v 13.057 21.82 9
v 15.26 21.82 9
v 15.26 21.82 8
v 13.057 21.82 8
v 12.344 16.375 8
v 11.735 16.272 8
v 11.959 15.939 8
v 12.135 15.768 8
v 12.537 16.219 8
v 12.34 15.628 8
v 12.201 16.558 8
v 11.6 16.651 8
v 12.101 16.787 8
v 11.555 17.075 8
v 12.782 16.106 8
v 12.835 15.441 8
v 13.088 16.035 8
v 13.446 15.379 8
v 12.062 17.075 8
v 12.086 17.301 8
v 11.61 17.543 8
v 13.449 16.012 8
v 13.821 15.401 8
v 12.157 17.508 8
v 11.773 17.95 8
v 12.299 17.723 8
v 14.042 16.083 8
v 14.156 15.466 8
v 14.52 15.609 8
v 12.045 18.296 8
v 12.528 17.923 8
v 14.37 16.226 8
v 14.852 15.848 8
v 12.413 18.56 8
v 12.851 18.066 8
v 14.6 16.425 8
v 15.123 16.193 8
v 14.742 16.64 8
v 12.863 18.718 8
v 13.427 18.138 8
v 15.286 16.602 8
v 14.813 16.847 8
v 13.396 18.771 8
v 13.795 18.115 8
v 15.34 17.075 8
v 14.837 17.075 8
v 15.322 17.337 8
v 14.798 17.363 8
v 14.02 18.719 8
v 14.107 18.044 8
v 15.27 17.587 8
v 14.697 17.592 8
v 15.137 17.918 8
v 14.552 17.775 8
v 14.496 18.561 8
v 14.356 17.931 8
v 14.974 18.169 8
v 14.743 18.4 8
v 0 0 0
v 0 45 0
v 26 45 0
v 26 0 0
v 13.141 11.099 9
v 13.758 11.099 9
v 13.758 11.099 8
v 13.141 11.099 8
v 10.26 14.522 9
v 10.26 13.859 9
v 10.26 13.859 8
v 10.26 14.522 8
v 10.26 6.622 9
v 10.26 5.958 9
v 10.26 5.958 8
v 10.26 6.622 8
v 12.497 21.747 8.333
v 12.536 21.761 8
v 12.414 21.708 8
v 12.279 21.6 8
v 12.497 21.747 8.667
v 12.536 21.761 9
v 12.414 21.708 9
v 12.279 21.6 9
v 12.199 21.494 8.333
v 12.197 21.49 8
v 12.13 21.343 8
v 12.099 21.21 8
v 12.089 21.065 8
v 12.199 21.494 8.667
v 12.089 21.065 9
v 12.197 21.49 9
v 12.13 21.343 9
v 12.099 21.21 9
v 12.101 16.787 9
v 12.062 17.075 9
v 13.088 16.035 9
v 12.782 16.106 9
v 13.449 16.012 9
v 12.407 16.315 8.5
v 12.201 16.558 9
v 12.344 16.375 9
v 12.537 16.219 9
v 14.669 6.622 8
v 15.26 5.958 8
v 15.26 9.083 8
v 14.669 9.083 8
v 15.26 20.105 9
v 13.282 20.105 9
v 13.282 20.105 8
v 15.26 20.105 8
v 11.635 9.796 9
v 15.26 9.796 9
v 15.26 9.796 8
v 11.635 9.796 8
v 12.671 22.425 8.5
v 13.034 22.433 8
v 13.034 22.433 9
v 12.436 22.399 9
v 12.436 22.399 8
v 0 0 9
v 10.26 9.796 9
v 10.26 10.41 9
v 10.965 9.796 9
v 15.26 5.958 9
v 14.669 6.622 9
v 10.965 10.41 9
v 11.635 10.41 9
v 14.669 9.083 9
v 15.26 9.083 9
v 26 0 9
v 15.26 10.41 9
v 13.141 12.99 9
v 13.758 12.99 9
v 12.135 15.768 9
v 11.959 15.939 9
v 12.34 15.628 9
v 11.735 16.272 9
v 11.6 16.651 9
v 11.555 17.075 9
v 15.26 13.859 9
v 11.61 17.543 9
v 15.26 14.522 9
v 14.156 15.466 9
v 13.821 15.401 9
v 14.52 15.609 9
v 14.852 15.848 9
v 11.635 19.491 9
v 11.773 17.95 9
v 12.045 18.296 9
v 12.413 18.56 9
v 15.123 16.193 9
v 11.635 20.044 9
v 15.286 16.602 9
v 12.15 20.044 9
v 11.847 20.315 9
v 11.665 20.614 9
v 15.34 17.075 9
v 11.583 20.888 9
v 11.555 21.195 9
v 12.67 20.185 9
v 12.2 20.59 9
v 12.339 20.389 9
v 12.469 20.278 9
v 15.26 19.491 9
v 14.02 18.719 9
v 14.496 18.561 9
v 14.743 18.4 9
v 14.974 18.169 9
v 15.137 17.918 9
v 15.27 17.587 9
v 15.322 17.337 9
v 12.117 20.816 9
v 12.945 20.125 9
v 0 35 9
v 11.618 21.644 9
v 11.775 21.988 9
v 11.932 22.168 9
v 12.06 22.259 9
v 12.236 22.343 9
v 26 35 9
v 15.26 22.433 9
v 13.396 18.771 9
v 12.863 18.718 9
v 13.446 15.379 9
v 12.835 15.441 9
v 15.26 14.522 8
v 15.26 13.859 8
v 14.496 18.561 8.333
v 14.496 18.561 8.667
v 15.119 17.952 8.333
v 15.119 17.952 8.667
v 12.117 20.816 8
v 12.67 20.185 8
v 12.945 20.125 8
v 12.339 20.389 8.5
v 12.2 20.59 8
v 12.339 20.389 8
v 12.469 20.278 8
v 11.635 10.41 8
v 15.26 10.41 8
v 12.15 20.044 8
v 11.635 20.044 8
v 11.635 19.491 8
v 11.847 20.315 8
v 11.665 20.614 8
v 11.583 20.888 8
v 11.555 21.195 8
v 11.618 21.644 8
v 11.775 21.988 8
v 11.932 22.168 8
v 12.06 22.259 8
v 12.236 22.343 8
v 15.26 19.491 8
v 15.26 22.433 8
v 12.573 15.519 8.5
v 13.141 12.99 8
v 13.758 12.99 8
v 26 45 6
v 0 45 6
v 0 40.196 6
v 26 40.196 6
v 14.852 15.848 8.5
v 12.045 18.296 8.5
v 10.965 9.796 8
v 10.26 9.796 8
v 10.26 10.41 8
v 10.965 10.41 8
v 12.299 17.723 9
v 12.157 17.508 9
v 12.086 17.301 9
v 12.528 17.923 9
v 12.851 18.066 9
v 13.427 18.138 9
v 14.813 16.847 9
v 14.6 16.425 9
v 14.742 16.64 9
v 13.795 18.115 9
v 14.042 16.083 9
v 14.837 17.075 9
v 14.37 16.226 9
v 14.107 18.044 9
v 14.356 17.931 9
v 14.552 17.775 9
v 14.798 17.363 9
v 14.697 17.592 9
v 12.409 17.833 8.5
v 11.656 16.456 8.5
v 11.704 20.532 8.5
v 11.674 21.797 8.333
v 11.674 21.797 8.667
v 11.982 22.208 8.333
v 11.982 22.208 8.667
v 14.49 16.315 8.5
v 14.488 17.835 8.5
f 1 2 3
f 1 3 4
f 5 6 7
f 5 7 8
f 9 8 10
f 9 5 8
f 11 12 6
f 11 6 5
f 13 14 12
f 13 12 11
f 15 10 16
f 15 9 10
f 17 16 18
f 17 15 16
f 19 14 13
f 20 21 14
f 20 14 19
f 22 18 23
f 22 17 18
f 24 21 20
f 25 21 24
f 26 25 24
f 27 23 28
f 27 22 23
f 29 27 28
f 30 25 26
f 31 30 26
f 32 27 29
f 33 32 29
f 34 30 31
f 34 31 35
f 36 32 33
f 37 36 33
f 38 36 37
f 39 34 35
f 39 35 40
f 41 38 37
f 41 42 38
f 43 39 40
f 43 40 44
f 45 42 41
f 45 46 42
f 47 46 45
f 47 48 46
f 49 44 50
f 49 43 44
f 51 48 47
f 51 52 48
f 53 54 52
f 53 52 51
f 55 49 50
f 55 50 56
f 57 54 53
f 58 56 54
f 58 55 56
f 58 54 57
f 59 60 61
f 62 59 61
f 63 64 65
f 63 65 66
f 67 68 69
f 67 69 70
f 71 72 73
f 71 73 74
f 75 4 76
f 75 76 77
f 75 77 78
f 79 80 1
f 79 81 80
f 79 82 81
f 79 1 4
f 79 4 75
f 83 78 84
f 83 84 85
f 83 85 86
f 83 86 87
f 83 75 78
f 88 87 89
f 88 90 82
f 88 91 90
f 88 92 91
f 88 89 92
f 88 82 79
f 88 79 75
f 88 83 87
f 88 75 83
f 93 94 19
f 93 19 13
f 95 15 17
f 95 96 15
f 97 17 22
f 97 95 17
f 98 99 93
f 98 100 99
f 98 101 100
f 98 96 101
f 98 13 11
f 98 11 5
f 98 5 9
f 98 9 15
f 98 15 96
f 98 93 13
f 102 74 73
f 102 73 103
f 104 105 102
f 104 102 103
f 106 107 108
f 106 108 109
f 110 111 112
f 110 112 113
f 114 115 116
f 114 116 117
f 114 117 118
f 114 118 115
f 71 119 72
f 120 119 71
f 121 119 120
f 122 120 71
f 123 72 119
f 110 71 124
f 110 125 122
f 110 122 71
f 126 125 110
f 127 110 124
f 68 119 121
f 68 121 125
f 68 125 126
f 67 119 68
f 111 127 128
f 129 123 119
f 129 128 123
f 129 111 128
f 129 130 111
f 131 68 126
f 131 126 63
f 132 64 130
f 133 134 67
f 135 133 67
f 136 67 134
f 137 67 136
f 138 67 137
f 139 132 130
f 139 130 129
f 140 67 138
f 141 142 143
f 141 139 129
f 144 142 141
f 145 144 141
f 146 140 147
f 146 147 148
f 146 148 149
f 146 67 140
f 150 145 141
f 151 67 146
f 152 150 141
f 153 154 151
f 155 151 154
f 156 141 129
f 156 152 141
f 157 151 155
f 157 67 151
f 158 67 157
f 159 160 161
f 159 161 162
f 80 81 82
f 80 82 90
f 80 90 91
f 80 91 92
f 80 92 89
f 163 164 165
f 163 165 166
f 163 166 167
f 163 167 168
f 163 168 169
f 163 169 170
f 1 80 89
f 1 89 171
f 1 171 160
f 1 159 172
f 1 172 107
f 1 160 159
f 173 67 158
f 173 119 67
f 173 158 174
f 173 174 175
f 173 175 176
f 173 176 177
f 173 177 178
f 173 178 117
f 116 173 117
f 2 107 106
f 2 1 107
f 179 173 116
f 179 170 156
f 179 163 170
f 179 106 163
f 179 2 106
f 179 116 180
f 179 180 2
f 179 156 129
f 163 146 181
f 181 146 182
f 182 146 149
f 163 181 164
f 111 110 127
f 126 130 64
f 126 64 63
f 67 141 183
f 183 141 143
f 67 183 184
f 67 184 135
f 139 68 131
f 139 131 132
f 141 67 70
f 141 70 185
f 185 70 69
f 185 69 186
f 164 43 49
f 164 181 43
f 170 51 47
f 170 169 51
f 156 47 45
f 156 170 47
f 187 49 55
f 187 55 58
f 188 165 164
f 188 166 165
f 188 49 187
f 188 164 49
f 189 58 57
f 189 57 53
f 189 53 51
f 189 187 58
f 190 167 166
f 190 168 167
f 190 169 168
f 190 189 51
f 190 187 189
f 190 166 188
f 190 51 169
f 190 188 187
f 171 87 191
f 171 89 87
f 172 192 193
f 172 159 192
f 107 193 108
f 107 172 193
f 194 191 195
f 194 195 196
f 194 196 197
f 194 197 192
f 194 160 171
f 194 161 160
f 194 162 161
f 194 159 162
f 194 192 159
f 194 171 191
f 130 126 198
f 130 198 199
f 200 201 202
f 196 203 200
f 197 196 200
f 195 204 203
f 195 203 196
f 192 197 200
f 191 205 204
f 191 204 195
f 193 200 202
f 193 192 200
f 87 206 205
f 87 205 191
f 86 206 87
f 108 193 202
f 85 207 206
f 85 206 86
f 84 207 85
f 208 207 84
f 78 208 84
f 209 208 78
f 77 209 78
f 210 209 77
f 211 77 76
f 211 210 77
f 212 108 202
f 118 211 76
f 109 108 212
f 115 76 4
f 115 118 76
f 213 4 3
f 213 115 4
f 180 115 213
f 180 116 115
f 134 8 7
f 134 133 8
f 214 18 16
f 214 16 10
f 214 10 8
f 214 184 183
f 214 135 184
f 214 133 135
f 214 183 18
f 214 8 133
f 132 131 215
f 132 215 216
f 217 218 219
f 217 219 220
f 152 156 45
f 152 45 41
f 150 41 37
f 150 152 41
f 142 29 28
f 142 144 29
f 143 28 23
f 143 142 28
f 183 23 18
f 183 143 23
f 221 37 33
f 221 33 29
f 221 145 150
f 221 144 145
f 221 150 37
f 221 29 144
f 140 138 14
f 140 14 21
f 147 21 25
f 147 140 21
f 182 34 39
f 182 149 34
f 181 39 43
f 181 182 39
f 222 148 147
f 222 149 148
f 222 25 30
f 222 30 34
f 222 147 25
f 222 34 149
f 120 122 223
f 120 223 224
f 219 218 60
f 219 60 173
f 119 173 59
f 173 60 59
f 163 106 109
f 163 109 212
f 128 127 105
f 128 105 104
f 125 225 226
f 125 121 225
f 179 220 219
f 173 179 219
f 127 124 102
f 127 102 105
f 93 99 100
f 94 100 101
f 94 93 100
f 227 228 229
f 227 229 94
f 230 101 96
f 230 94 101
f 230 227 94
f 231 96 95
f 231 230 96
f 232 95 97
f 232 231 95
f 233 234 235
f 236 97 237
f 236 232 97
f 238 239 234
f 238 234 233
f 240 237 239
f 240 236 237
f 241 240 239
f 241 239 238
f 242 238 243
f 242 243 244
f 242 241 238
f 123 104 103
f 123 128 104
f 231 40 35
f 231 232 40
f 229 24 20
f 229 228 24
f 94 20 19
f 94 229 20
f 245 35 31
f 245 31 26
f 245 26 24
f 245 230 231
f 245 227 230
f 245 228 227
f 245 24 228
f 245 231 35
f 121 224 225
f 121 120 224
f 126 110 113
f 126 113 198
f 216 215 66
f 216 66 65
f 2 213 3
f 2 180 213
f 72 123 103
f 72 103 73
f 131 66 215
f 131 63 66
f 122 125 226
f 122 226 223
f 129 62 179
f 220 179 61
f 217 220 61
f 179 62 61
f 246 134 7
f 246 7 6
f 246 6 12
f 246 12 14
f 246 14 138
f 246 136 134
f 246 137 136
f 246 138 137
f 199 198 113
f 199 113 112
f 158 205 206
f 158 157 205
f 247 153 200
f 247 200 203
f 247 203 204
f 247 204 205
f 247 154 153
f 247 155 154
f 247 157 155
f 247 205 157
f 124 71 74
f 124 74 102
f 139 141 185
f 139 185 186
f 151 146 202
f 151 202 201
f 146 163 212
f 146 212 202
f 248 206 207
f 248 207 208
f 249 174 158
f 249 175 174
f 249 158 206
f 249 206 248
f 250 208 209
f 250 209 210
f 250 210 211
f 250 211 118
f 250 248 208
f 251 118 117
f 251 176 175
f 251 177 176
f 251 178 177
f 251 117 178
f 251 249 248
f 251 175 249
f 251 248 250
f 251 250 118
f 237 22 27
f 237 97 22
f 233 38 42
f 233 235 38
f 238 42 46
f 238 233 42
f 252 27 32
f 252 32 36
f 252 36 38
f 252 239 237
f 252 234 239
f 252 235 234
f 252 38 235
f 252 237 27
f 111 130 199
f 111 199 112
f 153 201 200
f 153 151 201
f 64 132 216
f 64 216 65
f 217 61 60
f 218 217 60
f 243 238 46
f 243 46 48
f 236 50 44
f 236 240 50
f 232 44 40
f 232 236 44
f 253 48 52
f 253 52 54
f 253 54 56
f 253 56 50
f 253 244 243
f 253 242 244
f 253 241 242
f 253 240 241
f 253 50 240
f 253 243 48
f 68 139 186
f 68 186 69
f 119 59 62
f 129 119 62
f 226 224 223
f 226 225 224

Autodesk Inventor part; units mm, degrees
ref_plane "YZ Plane" through (0, 0, 0) normal (1, 0, 0) x (0, 1, 0)
ref_plane "XZ Plane" through (0, 0, 0) normal (0, 1, 0) x (-1, 0, 0)
ref_plane "XY Plane" through (0, 0, 0) normal (0, 0, 1) x (1, 0, 0)
sketch "Sketch1" plane through (0, 0, 0) normal (0, 0, 1) x (1, 0, 0)
  line L0 (0, 0) -> (26, 0)
  line L1 (26, 0) -> (26, 45)
  line L2 (26, 45) -> (0, 45)
  line L3 (0, 45) -> (0, 0)
  dimension "d0" = 26
  dimension "d1" = 45
extrude "Extrusion1" add sketch "Sketch1" along normal blind 6
sketch "Sketch2" plane through (0, 0, 6) normal (0, 0, 1) x (1, 0, 0)
  line L0 (26, 0) -> (26, 45) projected
  line L1 (0, 0) -> (26, 0)
  line L2 (26, 0) -> (26, 35)
  line L3 (26, 35) -> (0, 35)
  line L4 (0, 35) -> (0, 0)
  dimension "d4" = 35
extrude "Extrusion2" add sketch "Sketch2" along normal blind 3
draft "FaceDraft1" angle 60 pull direction (0, 0, 1) faces at (17.3333, 35, 7) fixed edges at (13, 35, 9)
sketch "Sketch3" plane through (0, 0, 9) normal (0, 0, 1) x (1, 0, 0)
  line L0 (10.2597, 5.4477) -> (10.2597, 19.6754) construction
  line L1 (10.2597, 19.6754) -> (17.2769, 19.6754) construction
  line L2 (17.2769, 19.6754) -> (17.2769, 5.4477) construction
  line L3 (17.2769, 5.4477) -> (10.2597, 5.4477) construction
  line L4 (0, 0) -> (26, 0) projected
  line L5 (13, 0) -> (13, 5.1104)
  line L6 (15.2597, 5.9584) -> (10.2597, 5.9584)
  line L7 (10.2597, 5.9584) -> (10.2597, 6.6215)
  line L8 (10.2597, 6.6215) -> (14.669, 6.6215)
  line L9 (14.669, 6.6215) -> (14.669, 9.0834)
  line L10 (14.669, 9.0834) -> (15.2597, 9.0834)
  line L11 (15.2597, 9.0834) -> (15.2597, 5.9584)
  line L12 (15.2597, 9.7961) -> (11.6354, 9.7961)
  line L13 (11.6354, 9.7961) -> (11.6354, 10.4096)
  line L14 (11.6354, 10.4096) -> (15.2597, 10.4096)
  line L15 (15.2597, 10.4096) -> (15.2597, 9.7961)
  line L16 (10.9647, 9.7961) -> (10.2597, 9.7961)
  line L17 (10.2597, 9.7961) -> (10.2597, 10.4096)
  line L18 (10.2597, 10.4096) -> (10.9647, 10.4096)
  line L19 (10.9647, 10.4096) -> (10.9647, 9.7961)
  line L20 (13.7581, 11.0994) -> (13.1408, 11.0994)
  line L21 (13.1408, 11.0994) -> (13.1408, 12.9897)
  line L22 (13.1408, 12.9897) -> (13.7581, 12.9897)
  line L23 (13.7581, 12.9897) -> (13.7581, 11.0994)
  line L24 (15.2597, 13.8586) -> (10.2597, 13.8586)
  line L25 (10.2597, 13.8586) -> (10.2597, 14.5217)
  line L26 (10.2597, 14.5217) -> (15.2597, 14.5217)
  line L27 (15.2597, 14.5217) -> (15.2597, 13.8586)
  spline S0 degree 2 poles (13.4456, 15.3791) (12.4433, 15.3791) (11.9593, 15.9394) knots 0 0 0 1 1 1
  spline S1 degree 2 poles (11.9593, 15.9394) (11.5554, 16.4043) (11.5554, 17.075) knots 0 0 0 1 1 1
  spline S2 degree 2 poles (11.5554, 17.075) (11.5554, 17.822) (12.5348, 18.7709) (13.3961, 18.7709) knots 0 0 0 1 2 2 2
  spline S3 degree 2 poles (13.3961, 18.7709) (14.0935, 18.7709) (14.8976, 18.3517) (15.3397, 17.5514) (15.3397, 17.075) knots 0 0 0 1 2 3 3 3
  spline S4 degree 2 poles (15.3397, 17.075) (15.3397, 16.3166) (14.3641, 15.3791) (13.4456, 15.3791) knots 0 0 0 1 2 2 2
  spline S5 degree 2 poles (13.4494, 16.0118) (14.143, 16.0118) (14.8366, 16.6177) (14.8366, 17.075) knots 0 0 0 1 2 2 2
  spline S6 degree 2 poles (14.8366, 17.075) (14.8366, 17.5323) (14.1392, 18.1383) (13.4266, 18.1383) knots 0 0 0 1 2 2 2
  spline S7 degree 2 poles (13.4266, 18.1383) (12.7558, 18.1383) (12.0622, 17.5285) (12.0622, 17.075) knots 0 0 0 1 2 2 2
  spline S8 degree 2 poles (12.0622, 17.075) (12.0622, 16.6177) (12.752, 16.0118) (13.4494, 16.0118) knots 0 0 0 1 2 2 2
  line L28 (15.2597, 19.4912) -> (11.6354, 19.4912)
  line L29 (11.6354, 19.4912) -> (11.6354, 20.0438)
  line L30 (11.6354, 20.0438) -> (12.1499, 20.0438)
  spline S9 degree 2 poles (12.1499, 20.0438) (11.5554, 20.4439) (11.5554, 21.1947) knots 0 0 0 1 1 1
  spline S10 degree 2 poles (11.5554, 21.1947) (11.5554, 21.5224) (11.7917, 22.0712) (12.1728, 22.3456) (12.4357, 22.399) knots 0 0 0 1 2 3 3 3
  spline S11 degree 2 poles (12.4357, 22.399) (12.6072, 22.4333) (13.034, 22.4333) knots 0 0 0 1 1 1
  line L31 (13.034, 22.4333) -> (15.2597, 22.4333)
  line L32 (15.2597, 22.4333) -> (15.2597, 21.8197)
  line L33 (15.2597, 21.8197) -> (13.0569, 21.8197)
  spline S12 degree 2 poles (13.0569, 21.8197) (12.6834, 21.8197) (12.31, 21.6749) (12.0889, 21.3128) (12.0889, 21.0651) knots 0 0 0 1 2 3 3 3
  spline S13 degree 2 poles (12.0889, 21.0651) (12.0889, 20.6726) (12.5882, 20.1048) (13.2818, 20.1048) knots 0 0 0 1 2 2 2
  line L34 (13.2818, 20.1048) -> (15.2597, 20.1048)
  line L35 (15.2597, 20.1048) -> (15.2597, 19.4912)
extrude "Extrusion3" cut sketch "Sketch3" against normal blind 1
properties part number "Li-IonBattery"
